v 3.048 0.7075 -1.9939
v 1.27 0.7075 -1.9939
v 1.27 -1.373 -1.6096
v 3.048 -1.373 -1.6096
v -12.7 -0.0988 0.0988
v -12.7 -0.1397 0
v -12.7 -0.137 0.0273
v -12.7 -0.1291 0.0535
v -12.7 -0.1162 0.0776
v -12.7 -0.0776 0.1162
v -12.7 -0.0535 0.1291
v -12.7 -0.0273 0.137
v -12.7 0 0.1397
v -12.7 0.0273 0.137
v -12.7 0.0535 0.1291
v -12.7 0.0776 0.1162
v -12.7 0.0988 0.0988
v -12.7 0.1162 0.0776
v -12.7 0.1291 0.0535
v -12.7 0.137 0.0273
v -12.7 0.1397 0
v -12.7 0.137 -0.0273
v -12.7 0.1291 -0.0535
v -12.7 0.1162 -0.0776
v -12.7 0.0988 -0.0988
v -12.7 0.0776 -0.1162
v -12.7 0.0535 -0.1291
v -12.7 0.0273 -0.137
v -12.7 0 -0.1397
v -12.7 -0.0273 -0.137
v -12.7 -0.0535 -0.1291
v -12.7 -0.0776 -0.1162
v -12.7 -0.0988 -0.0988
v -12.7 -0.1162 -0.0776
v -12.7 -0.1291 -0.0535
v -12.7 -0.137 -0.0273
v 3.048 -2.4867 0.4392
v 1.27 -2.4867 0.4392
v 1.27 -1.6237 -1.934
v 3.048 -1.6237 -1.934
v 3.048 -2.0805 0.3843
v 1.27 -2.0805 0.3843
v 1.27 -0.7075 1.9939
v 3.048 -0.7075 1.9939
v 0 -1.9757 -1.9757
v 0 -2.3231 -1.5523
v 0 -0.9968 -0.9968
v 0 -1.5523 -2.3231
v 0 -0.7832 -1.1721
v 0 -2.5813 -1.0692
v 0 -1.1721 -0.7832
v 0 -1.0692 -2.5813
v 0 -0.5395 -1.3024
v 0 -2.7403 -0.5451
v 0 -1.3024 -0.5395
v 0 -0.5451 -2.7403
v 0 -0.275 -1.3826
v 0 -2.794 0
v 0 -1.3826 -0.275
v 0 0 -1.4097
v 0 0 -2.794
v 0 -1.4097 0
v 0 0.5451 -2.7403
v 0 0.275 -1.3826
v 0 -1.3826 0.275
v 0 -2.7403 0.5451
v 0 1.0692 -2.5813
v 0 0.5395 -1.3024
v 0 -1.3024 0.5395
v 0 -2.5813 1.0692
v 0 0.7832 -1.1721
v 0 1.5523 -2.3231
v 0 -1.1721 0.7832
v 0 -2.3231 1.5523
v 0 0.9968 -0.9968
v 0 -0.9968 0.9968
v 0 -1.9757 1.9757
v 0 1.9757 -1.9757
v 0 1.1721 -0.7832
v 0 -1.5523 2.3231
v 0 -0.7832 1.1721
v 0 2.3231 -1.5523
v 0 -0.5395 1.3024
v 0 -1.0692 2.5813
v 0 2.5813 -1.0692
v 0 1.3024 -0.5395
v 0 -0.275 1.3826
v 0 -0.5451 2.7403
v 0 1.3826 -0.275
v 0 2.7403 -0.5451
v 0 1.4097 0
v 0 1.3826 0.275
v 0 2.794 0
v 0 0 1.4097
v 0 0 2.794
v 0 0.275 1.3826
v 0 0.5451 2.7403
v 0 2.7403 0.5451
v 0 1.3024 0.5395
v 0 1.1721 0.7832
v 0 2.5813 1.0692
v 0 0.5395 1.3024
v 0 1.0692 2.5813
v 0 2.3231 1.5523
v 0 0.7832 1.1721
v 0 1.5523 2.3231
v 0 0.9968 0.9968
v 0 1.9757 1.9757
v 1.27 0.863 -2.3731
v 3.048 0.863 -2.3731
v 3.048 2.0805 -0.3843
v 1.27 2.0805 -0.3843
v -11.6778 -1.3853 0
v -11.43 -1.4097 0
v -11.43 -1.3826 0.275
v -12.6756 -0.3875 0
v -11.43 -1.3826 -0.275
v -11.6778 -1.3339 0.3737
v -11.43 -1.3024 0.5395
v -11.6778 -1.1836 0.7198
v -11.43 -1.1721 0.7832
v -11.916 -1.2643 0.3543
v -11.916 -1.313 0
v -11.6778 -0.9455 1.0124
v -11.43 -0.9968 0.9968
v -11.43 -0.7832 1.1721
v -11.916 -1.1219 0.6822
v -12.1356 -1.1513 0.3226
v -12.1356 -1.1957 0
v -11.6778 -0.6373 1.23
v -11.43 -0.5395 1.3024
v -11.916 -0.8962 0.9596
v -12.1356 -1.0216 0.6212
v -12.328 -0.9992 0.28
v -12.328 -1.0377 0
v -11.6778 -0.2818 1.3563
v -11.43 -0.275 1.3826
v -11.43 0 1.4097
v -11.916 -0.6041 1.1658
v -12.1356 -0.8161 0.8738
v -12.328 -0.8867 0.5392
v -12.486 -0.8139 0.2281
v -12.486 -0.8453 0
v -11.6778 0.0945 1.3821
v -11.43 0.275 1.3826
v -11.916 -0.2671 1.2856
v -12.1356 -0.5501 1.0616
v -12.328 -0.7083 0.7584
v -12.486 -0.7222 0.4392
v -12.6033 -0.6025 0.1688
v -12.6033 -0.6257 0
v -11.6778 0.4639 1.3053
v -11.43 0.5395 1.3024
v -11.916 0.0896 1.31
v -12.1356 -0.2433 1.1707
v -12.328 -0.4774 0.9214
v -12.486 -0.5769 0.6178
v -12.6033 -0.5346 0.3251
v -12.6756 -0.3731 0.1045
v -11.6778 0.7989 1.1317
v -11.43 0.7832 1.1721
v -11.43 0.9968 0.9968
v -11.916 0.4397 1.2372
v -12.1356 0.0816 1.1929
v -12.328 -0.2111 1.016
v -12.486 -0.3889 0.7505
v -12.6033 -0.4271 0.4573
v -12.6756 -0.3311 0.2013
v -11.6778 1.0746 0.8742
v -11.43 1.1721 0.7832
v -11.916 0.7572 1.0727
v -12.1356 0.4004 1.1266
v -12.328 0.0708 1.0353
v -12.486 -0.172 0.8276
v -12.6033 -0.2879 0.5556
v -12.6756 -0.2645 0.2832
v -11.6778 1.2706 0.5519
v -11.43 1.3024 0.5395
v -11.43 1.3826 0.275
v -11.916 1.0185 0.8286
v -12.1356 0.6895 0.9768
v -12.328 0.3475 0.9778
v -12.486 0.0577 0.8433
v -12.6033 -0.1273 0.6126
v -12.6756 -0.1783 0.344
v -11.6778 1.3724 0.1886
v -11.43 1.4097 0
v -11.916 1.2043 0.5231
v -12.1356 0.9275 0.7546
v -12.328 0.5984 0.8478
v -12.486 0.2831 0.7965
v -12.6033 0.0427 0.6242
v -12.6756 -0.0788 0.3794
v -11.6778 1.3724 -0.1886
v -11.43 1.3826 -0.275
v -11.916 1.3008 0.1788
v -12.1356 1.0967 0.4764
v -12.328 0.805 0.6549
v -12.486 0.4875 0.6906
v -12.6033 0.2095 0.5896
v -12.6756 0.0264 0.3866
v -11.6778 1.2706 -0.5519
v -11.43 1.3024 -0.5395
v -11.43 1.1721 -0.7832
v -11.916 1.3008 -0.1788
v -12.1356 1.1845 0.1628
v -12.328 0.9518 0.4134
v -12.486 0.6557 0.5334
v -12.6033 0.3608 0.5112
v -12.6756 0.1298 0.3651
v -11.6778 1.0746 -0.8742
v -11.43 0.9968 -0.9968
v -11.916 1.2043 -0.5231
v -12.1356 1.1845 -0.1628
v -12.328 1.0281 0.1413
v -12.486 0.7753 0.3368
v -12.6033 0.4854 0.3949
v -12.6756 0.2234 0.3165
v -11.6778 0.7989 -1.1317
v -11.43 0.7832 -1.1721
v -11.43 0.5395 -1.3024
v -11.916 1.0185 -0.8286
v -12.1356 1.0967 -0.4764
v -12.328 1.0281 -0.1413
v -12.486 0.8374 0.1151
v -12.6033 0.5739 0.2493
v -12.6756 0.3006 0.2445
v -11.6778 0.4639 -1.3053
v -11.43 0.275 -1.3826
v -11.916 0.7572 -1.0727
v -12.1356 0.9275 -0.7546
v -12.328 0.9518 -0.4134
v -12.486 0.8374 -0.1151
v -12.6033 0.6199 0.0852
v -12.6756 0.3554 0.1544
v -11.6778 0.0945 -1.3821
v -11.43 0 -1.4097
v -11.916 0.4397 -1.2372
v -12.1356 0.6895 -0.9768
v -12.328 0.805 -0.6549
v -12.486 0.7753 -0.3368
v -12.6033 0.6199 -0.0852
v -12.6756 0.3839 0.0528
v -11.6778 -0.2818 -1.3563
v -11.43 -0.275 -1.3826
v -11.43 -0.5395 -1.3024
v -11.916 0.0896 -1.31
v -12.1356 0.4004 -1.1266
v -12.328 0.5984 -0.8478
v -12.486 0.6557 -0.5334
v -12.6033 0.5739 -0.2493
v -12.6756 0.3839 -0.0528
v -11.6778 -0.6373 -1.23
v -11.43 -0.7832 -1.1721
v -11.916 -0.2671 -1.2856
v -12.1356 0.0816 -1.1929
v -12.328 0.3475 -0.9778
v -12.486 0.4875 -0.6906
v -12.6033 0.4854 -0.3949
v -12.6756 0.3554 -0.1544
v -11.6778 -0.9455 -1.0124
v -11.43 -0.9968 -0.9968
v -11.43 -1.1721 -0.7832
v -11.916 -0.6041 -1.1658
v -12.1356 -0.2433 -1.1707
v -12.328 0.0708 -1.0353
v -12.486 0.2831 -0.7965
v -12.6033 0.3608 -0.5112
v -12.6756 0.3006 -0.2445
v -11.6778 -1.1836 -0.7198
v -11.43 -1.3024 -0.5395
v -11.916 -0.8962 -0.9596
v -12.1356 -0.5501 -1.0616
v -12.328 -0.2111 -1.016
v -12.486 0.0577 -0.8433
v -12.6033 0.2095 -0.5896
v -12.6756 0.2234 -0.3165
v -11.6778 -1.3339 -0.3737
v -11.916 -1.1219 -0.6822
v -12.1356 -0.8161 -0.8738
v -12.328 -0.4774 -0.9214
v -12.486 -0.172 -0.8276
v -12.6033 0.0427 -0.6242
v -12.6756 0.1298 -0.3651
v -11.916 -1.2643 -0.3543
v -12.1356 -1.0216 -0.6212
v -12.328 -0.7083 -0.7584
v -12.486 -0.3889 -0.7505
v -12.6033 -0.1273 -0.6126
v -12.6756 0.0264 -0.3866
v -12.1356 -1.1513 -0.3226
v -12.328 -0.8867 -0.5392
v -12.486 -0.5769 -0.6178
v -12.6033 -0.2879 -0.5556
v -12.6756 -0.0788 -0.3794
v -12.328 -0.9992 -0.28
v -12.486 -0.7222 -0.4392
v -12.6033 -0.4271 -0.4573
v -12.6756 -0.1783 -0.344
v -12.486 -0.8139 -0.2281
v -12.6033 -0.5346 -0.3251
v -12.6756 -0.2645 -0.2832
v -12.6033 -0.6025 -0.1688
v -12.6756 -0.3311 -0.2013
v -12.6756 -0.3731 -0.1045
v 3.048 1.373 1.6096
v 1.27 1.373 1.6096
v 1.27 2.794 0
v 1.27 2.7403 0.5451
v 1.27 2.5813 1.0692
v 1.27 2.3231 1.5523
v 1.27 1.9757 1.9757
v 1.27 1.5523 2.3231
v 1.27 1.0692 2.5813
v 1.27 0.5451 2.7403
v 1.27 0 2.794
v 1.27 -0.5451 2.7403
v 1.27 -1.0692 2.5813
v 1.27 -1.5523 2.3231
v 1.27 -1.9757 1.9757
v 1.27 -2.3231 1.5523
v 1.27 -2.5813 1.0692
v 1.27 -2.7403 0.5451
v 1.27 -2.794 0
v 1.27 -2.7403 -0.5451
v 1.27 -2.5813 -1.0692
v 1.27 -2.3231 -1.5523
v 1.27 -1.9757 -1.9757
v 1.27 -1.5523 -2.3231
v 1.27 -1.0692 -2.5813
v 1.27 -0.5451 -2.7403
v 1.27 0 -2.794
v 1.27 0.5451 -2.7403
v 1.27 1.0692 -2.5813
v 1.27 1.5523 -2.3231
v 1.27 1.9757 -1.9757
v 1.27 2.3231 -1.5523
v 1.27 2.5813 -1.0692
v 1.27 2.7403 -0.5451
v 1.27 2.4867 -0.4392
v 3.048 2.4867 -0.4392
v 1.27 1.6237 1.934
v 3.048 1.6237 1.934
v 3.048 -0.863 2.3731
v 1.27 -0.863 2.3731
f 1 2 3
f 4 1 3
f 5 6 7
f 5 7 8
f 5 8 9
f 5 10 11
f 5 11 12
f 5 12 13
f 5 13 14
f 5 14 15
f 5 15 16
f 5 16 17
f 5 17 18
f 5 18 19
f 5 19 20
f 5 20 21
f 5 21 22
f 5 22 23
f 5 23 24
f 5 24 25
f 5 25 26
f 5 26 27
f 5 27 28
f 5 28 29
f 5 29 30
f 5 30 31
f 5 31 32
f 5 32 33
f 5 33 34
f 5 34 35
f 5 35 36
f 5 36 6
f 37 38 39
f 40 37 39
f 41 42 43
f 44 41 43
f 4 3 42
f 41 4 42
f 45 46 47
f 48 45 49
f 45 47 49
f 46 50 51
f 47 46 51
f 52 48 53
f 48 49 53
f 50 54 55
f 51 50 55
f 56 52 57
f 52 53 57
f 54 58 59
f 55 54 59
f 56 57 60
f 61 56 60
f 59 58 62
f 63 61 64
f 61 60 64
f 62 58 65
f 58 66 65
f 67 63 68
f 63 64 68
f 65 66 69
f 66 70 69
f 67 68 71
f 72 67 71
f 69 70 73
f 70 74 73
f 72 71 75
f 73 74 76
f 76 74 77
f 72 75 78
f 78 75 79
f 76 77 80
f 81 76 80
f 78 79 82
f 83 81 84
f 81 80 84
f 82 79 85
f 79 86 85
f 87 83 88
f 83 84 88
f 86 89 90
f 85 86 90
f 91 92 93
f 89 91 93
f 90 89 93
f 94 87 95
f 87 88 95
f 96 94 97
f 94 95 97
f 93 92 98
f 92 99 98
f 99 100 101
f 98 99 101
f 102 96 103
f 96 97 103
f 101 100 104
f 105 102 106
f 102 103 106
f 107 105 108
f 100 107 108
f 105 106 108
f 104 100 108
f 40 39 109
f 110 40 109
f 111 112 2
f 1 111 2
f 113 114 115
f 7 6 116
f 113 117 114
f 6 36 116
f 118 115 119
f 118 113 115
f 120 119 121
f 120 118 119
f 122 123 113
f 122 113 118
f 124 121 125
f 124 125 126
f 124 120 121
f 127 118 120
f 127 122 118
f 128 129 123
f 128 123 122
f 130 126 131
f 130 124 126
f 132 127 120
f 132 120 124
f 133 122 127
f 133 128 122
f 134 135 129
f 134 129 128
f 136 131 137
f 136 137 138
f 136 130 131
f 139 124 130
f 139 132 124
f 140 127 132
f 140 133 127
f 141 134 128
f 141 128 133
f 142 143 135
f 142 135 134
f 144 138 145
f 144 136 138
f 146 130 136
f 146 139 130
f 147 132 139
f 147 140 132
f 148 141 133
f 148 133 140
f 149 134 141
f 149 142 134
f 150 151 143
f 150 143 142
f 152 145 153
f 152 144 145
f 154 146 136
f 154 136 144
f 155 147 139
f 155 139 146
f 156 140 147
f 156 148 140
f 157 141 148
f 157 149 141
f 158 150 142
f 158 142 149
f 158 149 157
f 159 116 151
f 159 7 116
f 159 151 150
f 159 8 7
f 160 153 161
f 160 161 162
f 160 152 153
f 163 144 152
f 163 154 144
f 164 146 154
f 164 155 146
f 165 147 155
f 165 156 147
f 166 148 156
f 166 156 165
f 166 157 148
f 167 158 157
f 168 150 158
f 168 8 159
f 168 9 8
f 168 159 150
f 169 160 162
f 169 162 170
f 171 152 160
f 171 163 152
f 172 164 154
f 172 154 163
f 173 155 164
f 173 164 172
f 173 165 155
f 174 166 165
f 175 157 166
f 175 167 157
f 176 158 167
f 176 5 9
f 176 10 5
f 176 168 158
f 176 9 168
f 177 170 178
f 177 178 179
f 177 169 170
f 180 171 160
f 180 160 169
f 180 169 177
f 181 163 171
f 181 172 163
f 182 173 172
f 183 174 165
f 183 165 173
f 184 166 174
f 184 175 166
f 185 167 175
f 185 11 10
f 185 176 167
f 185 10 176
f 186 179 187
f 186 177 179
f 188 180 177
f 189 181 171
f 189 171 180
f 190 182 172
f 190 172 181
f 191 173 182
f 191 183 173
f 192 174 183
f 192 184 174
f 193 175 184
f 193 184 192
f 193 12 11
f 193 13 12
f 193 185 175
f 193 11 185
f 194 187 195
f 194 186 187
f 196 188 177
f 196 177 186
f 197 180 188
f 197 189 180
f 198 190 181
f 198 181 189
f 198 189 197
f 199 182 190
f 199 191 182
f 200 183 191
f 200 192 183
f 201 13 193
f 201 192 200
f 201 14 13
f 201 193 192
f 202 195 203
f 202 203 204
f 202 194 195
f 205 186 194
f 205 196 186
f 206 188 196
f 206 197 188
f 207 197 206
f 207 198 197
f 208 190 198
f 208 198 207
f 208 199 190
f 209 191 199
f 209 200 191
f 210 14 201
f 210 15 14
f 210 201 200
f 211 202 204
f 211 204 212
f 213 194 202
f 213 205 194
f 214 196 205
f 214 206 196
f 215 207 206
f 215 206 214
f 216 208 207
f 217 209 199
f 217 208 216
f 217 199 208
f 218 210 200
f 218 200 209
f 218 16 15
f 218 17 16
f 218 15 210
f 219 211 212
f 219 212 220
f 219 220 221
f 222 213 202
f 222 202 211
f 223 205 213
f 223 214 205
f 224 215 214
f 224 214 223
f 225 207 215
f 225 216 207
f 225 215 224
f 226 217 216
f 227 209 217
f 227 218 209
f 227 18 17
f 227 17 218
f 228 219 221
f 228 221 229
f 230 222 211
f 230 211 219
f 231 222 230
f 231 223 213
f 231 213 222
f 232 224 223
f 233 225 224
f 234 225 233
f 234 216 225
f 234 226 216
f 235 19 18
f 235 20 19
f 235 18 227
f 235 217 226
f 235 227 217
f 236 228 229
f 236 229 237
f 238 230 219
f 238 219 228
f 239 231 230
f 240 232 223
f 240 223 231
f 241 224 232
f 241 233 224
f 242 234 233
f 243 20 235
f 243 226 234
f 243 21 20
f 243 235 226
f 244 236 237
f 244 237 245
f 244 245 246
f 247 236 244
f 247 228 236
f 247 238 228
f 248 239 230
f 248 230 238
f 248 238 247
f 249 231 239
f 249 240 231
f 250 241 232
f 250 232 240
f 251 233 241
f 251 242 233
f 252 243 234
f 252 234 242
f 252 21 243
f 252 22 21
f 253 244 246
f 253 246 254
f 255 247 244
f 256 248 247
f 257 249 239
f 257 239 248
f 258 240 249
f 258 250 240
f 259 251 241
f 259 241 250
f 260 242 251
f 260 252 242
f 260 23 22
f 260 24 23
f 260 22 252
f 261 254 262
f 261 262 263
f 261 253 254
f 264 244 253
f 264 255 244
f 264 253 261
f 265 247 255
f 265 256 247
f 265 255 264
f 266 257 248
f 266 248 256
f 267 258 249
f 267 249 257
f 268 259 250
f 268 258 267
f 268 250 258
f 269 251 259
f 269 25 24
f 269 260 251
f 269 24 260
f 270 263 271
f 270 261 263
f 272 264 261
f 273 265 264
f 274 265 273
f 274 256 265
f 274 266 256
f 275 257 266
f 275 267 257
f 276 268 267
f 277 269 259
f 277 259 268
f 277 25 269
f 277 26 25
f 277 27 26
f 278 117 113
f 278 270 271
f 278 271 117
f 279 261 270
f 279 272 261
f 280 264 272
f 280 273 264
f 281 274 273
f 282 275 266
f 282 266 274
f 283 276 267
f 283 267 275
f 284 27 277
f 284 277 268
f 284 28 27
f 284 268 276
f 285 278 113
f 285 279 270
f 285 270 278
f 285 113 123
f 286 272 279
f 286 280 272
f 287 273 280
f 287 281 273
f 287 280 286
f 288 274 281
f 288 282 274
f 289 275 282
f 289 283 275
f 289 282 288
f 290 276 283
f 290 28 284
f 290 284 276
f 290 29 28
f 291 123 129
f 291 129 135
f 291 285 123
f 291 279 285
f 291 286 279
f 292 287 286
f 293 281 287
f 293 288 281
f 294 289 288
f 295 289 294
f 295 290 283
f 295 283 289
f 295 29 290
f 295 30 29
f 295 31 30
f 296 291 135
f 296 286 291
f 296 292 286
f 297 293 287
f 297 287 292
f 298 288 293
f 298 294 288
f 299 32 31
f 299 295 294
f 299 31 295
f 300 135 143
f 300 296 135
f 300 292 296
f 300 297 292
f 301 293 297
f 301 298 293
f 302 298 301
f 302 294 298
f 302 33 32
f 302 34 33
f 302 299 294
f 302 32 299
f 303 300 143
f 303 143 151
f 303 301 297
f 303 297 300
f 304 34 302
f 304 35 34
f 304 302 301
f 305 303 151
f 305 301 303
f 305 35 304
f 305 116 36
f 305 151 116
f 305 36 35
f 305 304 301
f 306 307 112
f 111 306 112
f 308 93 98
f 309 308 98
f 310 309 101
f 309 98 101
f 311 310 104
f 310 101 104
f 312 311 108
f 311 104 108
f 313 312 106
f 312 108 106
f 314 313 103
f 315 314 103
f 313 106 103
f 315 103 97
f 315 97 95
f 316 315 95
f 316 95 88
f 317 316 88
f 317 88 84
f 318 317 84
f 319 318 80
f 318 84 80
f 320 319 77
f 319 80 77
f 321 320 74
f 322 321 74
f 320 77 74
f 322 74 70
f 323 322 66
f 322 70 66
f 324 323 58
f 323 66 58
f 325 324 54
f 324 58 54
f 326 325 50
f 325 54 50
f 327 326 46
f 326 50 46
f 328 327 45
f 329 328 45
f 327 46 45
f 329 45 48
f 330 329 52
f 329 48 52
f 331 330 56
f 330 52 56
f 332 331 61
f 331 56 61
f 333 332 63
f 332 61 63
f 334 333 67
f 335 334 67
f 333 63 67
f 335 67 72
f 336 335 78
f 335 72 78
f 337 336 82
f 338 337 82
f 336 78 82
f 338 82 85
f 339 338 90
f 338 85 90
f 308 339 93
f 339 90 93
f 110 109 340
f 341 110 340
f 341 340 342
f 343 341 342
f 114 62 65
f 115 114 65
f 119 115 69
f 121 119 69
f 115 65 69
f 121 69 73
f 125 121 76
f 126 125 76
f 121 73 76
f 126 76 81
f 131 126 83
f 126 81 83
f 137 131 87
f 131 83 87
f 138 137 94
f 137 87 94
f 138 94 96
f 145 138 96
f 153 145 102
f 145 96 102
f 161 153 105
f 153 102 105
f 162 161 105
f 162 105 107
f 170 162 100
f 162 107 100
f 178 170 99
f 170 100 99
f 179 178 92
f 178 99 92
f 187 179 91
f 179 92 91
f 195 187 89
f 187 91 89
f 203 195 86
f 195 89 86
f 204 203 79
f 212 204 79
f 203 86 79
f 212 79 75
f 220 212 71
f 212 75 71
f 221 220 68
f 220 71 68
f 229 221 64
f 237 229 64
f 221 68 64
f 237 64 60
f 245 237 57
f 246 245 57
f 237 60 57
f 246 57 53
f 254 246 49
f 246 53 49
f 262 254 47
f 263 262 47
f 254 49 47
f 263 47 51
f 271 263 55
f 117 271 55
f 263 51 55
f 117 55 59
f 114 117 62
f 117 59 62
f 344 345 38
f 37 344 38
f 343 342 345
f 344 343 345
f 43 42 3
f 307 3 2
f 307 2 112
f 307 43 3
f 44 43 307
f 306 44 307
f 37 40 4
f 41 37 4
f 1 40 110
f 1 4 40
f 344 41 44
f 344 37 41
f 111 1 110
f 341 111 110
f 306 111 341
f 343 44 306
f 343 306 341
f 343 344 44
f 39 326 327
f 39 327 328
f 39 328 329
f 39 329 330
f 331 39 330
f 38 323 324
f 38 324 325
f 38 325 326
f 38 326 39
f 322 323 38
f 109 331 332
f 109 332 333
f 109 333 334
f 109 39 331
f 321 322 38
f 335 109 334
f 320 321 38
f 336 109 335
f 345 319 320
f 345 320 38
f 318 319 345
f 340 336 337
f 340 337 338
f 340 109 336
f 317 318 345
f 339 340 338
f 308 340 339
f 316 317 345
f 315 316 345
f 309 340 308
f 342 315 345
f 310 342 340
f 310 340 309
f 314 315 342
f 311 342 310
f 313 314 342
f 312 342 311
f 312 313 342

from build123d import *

# Parameters (mm, degrees)
F0_R     = 2.794
F1_DEPTH = 1.27
F3_DEPTH = 1.778
F4_R     = 1.4097
F5_DEPTH = 12.7
F6_R     = 1.27


with BuildPart() as f1:
    # F0 (on Right) → F1 (new body)
    with BuildSketch(Plane.YZ):
        Circle(F0_R)
    extrude(amount=F1_DEPTH)

    # F2 (on face) → F3 (join)
    with BuildSketch(Plane.YZ.offset(1.27)):
        Polygon((-1.623683, -1.933988), (0.863042, -2.373145), (2.486725, -0.439157), (1.623683, 1.933988), (-0.863042, 2.373145), (-2.486725, 0.439157), align=None)
        Polygon((2.080505, -0.384262), (0.707472, -1.993901), (-1.373033, -1.609639), (-2.080505, 0.384262), (-0.707472, 1.993901), (1.373033, 1.609639), align=None, mode=Mode.SUBTRACT)
    extrude(amount=F3_DEPTH)

    # F4 (on face) → F5 (join)
    with BuildSketch(Plane(origin=(0, 0, 0), x_dir=(0, -1, 0), z_dir=(-1, 0, 0))):
        Circle(F4_R)
    extrude(amount=F5_DEPTH)

    # F6
    f6_edges = [f1.edges().sort_by_distance(p)[0] for p in [
        (-12.7, 1.4097, 0),
    ]]
    fillet(f6_edges, radius=F6_R)


solid = f1.part
